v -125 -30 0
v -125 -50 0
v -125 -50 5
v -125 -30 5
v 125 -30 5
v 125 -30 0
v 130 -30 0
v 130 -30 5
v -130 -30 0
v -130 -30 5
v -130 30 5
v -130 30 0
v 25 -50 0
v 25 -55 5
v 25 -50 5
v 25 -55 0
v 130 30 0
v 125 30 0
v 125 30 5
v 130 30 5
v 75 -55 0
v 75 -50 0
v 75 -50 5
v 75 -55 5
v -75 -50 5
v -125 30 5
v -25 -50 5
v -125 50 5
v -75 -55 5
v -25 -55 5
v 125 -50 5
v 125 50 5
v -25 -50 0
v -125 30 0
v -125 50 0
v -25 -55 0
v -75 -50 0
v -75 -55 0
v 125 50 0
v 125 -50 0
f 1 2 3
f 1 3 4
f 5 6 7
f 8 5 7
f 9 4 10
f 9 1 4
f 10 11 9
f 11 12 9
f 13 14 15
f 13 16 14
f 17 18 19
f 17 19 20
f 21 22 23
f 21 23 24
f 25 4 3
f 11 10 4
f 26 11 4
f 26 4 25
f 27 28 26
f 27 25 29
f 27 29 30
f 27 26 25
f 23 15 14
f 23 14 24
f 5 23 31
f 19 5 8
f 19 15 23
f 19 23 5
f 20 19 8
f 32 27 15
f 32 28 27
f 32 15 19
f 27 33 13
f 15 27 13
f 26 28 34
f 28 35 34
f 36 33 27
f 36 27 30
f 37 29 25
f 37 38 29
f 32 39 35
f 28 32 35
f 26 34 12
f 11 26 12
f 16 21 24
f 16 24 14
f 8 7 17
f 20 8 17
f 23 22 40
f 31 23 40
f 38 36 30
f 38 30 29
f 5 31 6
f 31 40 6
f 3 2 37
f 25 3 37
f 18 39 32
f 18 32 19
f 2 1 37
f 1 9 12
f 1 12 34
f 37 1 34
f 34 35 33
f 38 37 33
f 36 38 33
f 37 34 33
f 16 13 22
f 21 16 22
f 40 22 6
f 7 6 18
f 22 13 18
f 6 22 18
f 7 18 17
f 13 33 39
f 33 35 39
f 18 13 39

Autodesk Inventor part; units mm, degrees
ref_plane "YZ Plane" through (0, 0, 0) normal (1, 0, 0) x (0, 1, 0)
ref_plane "XZ Plane" through (0, 0, 0) normal (0, 1, 0) x (-1, 0, 0)
ref_plane "XY Plane" through (0, 0, 0) normal (0, 0, 1) x (1, 0, 0)
sketch "Sketch1" plane through (0, 0, 0) normal (0, 0, 1) x (1, 0, 0)
  line L0 (-130, -50) -> (130, -50)
  line L1 (130, -50) -> (130, 50)
  line L2 (130, 50) -> (-130, 50)
  line L3 (-130, 50) -> (-130, -50)
  line L4 (-130, -50) -> (130, 50) construction
  line L5 (130, -50) -> (-130, 50) construction
  line L6 (-75, -50) -> (-25, -50)
  line L7 (-25, -50) -> (-25, -55)
  line L8 (-25, -55) -> (-75, -55)
  line L9 (-75, -55) -> (-75, -50)
  line L10 (25, -50) -> (75, -50)
  line L11 (75, -50) -> (75, -55)
  line L12 (75, -55) -> (25, -55)
  line L13 (25, -55) -> (25, -50)
  line L14 (130, 50) -> (125, 50)
  line L15 (125, 50) -> (125, 30)
  line L16 (125, 30) -> (130, 30)
  line L17 (130, 30) -> (130, 50)
  line L18 (130, -50) -> (125, -50)
  line L19 (125, -50) -> (125, -30)
  line L20 (125, -30) -> (130, -30)
  line L21 (130, -30) -> (130, -50)
  line L22 (0, 50) -> (0, -50) construction
  line L23 (-125, 50) -> (-125, 30)
  line L24 (-125, 30) -> (-130, 30)
  line L25 (-125, -50) -> (-125, -30)
  line L26 (-125, -30) -> (-130, -30)
  point P0 (0, 0)
  point P1 (-75, -52.5)
  point P2 (75, -50)
  point P3 (-125, -50)
  point P4 (130, -30)
  point P5 (130, 30)
  point P6 (125, 50)
  point P7 (-125, 50)
  point P8 (-130, 30)
  dimension "d0" = 260
  dimension "d1" = 100
  dimension "d2" = 50
  dimension "d3" = 50
  dimension "d4" = 50
  dimension "d5" = 55
  dimension "d6" = 5
  dimension "d10" = 20
  dimension "d12" = 5
  dimension "d13" = 20
extrude "Extrusion1" add sketch "Sketch1" along normal blind 5 contours L25 L26 L3 L24 L23 L2 L15 L16 L1 L20 L19 L0 | L0 L7 L8 L9 | L0 L11 L12 L13
equation "\"BendRadius\" = Thickness"
equation "\"BendReliefWidth\" = Thickness"
equation "\"BendReliefDepth\" = 0.5 * Thickness"
equation "\"CornerReliefSize\" = 4 * Thickness"
equation "\"MinimumRemnant\" = 2 * Thickness"
equation "\"TransitionRadius\" = BendRadius"
equation "\"JacobiRadiusSize\" = BendRadius"
equation "\"GapSize\" = Thickness"
equation "\"Thickness\" = 3.048"
properties part number "Lat1(3)" material "Wood (Cherry)"
